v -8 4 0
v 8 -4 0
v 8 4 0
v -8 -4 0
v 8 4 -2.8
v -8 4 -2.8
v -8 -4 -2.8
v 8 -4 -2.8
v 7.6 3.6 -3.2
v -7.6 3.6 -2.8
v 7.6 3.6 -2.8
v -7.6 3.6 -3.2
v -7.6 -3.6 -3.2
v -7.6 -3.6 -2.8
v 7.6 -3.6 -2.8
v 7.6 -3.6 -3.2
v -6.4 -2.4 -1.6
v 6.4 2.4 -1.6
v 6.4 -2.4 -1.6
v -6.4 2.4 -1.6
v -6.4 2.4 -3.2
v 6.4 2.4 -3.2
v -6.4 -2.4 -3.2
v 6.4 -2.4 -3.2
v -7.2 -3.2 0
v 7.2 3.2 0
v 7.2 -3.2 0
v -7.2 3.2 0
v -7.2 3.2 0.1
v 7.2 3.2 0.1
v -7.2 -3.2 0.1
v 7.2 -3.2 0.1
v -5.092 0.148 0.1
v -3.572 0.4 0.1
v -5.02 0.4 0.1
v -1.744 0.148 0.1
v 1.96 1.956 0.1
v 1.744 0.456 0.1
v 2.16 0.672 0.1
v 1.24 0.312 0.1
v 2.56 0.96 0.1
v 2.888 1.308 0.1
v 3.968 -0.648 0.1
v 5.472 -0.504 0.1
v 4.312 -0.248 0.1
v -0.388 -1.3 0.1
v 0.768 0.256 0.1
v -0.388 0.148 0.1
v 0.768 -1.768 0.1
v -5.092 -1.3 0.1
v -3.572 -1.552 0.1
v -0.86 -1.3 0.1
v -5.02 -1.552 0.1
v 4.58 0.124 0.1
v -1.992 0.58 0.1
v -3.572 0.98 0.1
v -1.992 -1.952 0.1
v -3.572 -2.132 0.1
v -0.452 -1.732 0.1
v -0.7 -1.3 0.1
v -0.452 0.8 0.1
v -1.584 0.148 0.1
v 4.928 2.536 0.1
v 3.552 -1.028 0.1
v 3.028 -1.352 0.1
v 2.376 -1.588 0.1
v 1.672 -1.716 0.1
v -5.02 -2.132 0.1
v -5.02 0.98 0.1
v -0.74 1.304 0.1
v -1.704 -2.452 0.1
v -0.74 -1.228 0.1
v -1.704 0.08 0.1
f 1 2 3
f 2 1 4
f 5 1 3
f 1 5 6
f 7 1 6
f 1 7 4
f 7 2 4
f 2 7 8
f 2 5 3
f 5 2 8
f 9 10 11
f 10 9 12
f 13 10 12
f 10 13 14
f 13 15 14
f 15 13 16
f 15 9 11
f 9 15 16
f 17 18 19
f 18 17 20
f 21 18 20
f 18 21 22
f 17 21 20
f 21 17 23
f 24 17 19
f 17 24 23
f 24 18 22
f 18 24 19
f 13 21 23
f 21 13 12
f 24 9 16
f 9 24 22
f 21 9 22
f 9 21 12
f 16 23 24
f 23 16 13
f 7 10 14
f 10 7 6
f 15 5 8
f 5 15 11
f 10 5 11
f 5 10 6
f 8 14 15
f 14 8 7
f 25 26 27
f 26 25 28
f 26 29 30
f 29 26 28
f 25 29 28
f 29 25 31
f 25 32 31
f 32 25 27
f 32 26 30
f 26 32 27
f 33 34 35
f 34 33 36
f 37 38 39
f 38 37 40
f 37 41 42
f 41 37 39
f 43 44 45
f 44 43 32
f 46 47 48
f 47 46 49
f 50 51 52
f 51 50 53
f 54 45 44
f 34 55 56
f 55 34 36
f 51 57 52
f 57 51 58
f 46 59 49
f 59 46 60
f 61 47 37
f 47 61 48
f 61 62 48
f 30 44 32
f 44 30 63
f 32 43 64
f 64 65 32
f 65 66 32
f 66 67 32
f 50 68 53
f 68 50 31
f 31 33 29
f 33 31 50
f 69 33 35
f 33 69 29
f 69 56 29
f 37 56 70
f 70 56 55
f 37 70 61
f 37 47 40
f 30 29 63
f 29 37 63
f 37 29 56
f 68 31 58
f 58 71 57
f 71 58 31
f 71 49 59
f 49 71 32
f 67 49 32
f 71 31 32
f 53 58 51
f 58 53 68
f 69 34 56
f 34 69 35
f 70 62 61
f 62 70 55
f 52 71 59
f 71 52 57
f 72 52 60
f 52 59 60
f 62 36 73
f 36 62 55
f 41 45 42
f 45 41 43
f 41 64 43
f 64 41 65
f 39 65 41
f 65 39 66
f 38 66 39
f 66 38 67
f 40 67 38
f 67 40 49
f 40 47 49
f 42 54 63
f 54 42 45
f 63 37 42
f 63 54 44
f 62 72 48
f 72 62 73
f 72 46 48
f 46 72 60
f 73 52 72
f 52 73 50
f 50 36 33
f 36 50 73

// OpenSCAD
// file: ../p/box5.scad
use <../lib.scad>
function ldraw_lib__box5() = [
// 0 Box with 5 Faces and All Edges
// 0 Name: box5.dat
// 0 Author: James Jessiman
// 0 !LDRAW_ORG Primitive UPDATE 2012-01
// 0 !LICENSE Licensed under CC BY 4.0 : see CAreadme.txt
// 
// 0 BFC CERTIFY CCW
  [0,"BFC","CERTIFY"],
  [0,"BFC","CCW"],
// 
// 0 !HISTORY 2002-04-03 [sbliss] Modified for BFC compliance
// 0 !HISTORY 2002-04-25 [PTadmin] Official Update 2002-02
// 0 !HISTORY 2007-06-24 [PTadmin] Header formatted for Contributor Agreement
// 0 !HISTORY 2008-07-01 [PTadmin] Official Update 2008-01
// 0 !HISTORY 2012-02-16 [Philo] Changed to CCW
// 0 !HISTORY 2012-03-30 [PTadmin] Official Update 2012-01
// 
// 
// 2 24 1 1 1 -1 1 1
  [2,24,1,1,1,-1,1,1],
// 2 24 -1 1 1 -1 1 -1
  [2,24,-1,1,1,-1,1,-1],
// 2 24 -1 1 -1 1 1 -1
  [2,24,-1,1,-1,1,1,-1],
// 2 24 1 1 -1 1 1 1
  [2,24,1,1,-1,1,1,1],
// 2 24 1 0 1 -1 0 1
  [2,24,1,0,1,-1,0,1],
// 2 24 -1 0 1 -1 0 -1
  [2,24,-1,0,1,-1,0,-1],
// 2 24 -1 0 -1 1 0 -1
  [2,24,-1,0,-1,1,0,-1],
// 2 24 1 0 -1 1 0 1
  [2,24,1,0,-1,1,0,1],
// 2 24 1 0 1 1 1 1
  [2,24,1,0,1,1,1,1],
// 2 24 -1 0 1 -1 1 1
  [2,24,-1,0,1,-1,1,1],
// 2 24 1 0 -1 1 1 -1
  [2,24,1,0,-1,1,1,-1],
// 2 24 -1 0 -1 -1 1 -1
  [2,24,-1,0,-1,-1,1,-1],
// 4 16 -1 1 1 1 1 1 1 1 -1 -1 1 -1
  [4,16,-1,1,1,1,1,1,1,1,-1,-1,1,-1],
// 4 16 -1 1 1 -1 0 1 1 0 1 1 1 1
  [4,16,-1,1,1,-1,0,1,1,0,1,1,1,1],
// 4 16 -1 1 -1 -1 0 -1 -1 0 1 -1 1 1
  [4,16,-1,1,-1,-1,0,-1,-1,0,1,-1,1,1],
// 4 16 1 1 -1 1 0 -1 -1 0 -1 -1 1 -1
  [4,16,1,1,-1,1,0,-1,-1,0,-1,-1,1,-1],
// 4 16 1 1 1 1 0 1 1 0 -1 1 1 -1
  [4,16,1,1,1,1,0,1,1,0,-1,1,1,-1],
];
module ldraw_lib__box5(step=0, col=false, unit=2/5, alt=false, line=0.2, solid=!$preview)
    makepoly(ldraw_lib__box5(), step=step, col=col, unit=unit, alt=alt, line=line, solid=solid);
ldraw_lib__box5(line=0.2);
// file: ../p/box4.scad
use <../lib.scad>
function ldraw_lib__box4() = [
// 0 Box with 4 Faces (2 Parallel Pairs) and All Edges
// 0 Name: box4.dat
// 0 Author: James Jessiman
// 0 !LDRAW_ORG Primitive UPDATE 2012-01
// 0 !LICENSE Licensed under CC BY 4.0 : see CAreadme.txt
// 
// 0 BFC CERTIFY CCW
  [0,"BFC","CERTIFY"],
  [0,"BFC","CCW"],
// 
// 0 !HISTORY 2002-04-03 [sbliss] Modified for BFC compliance
// 0 !HISTORY 2002-04-25 [PTadmin] Official Update 2002-02
// 0 !HISTORY 2007-06-24 [PTadmin] Header formatted for Contributor Agreement
// 0 !HISTORY 2008-07-01 [PTadmin] Official Update 2008-01
// 0 !HISTORY 2012-02-16 [Philo] Changed to CCW
// 0 !HISTORY 2012-03-30 [PTadmin] Official Update 2012-01
// 
// 
// 2 24 1 1 1 -1 1 1
  [2,24,1,1,1,-1,1,1],
// 2 24 -1 1 1 -1 1 -1
  [2,24,-1,1,1,-1,1,-1],
// 2 24 -1 1 -1 1 1 -1
  [2,24,-1,1,-1,1,1,-1],
// 2 24 1 1 -1 1 1 1
  [2,24,1,1,-1,1,1,1],
// 2 24 1 0 1 -1 0 1
  [2,24,1,0,1,-1,0,1],
// 2 24 -1 0 1 -1 0 -1
  [2,24,-1,0,1,-1,0,-1],
// 2 24 -1 0 -1 1 0 -1
  [2,24,-1,0,-1,1,0,-1],
// 2 24 1 0 -1 1 0 1
  [2,24,1,0,-1,1,0,1],
// 2 24 1 0 1 1 1 1
  [2,24,1,0,1,1,1,1],
// 2 24 -1 0 1 -1 1 1
  [2,24,-1,0,1,-1,1,1],
// 2 24 1 0 -1 1 1 -1
  [2,24,1,0,-1,1,1,-1],
// 2 24 -1 0 -1 -1 1 -1
  [2,24,-1,0,-1,-1,1,-1],
// 4 16 -1 1 1 -1 0 1 1 0 1 1 1 1
  [4,16,-1,1,1,-1,0,1,1,0,1,1,1,1],
// 4 16 -1 1 -1 -1 0 -1 -1 0 1 -1 1 1
  [4,16,-1,1,-1,-1,0,-1,-1,0,1,-1,1,1],
// 4 16 1 1 -1 1 0 -1 -1 0 -1 -1 1 -1
  [4,16,1,1,-1,1,0,-1,-1,0,-1,-1,1,-1],
// 4 16 1 1 1 1 0 1 1 0 -1 1 1 -1
  [4,16,1,1,1,1,0,1,1,0,-1,1,1,-1],
];
module ldraw_lib__box4(step=0, col=false, unit=2/5, alt=false, line=0.2, solid=!$preview)
    makepoly(ldraw_lib__box4(), step=step, col=col, unit=unit, alt=alt, line=line, solid=solid);
ldraw_lib__box4(line=0.2);
// file: ../p/box5-12.scad
use <../lib.scad>
function ldraw_lib__box5_12() = [
// 0 Box with 5 Faces without Any Edges
// 0 Name: box5-12.dat
// 0 Author: Chris Dee [cwdee]
// 0 !LDRAW_ORG Primitive UPDATE 2009-02
// 0 !LICENSE Licensed under CC BY 4.0 : see CAreadme.txt
// 
// 0 BFC CERTIFY CCW
  [0,"BFC","CERTIFY"],
  [0,"BFC","CCW"],
// 
// 0 !HISTORY 2009-09-03 [PTadmin] Official Update 2009-02
// 
// 
// 4 16 1 1 1 1 1 -1 -1 1 -1 -1 1 1
  [4,16,1,1,1,1,1,-1,-1,1,-1,-1,1,1],
// 4 16 -1 0 1 1 0 1 1 1 1 -1 1 1
  [4,16,-1,0,1,1,0,1,1,1,1,-1,1,1],
// 4 16 -1 0 -1 -1 0 1 -1 1 1 -1 1 -1
  [4,16,-1,0,-1,-1,0,1,-1,1,1,-1,1,-1],
// 4 16 1 0 -1 -1 0 -1 -1 1 -1 1 1 -1
  [4,16,1,0,-1,-1,0,-1,-1,1,-1,1,1,-1],
// 4 16 1 0 1 1 0 -1 1 1 -1 1 1 1
  [4,16,1,0,1,1,0,-1,1,1,-1,1,1,1],
// 0
];
module ldraw_lib__box5_12(step=0, col=false, unit=2/5, alt=false, line=0.2, solid=!$preview)
    makepoly(ldraw_lib__box5_12(), step=step, col=col, unit=unit, alt=alt, line=line, solid=solid);
ldraw_lib__box5_12(line=0.2);
// file: s/3069bs01.scad
use <../../lib.scad>
use <../../p/box4.scad>
use <../../p/box5.scad>
function ldraw_lib__s__3069bs01() = [
// 0 ~Tile  1 x  2 with Groove without Top Face
// 0 Name: s\3069bs01.dat
// 0 Author: Santeri Piippo [arezey]
// 0 !LDRAW_ORG Subpart UPDATE 2010-02
// 0 !LICENSE Licensed under CC BY 4.0 : see CAreadme.txt
// 
// 0 BFC CERTIFY CCW
  [0,"BFC","CERTIFY"],
  [0,"BFC","CCW"],
// 
// 0 !HISTORY 2010-07-05 [PTadmin] Official Update 2010-02
// 
// 
// 1 16 0 0 0 20 0 0 0 7 0 0 0 10 box4.dat
  [1,16,0,0,0,20,0,0,0,7,0,0,0,10, ldraw_lib__box4()],
// 1 16 0 7 0 19 0 0 0 1 0 0 0 9 box4.dat
  [1,16,0,7,0,19,0,0,0,1,0,0,0,9, ldraw_lib__box4()],
// 0 BFC INVERTNEXT
  [0,"BFC","INVERTNEXT"],
// 1 16 0 8 0 16 0 0 0 -4 0 0 0 6 box5.dat
  [1,16,0,8,0,16,0,0,0,-4,0,0,0,6, ldraw_lib__box5()],
// 4 16 -19 8 9 -16 8 6 -16 8 -6 -19 8 -9
  [4,16,-19,8,9,-16,8,6,-16,8,-6,-19,8,-9],
// 4 16 19 8 -9 16 8 -6 16 8 6 19 8 9
  [4,16,19,8,-9,16,8,-6,16,8,6,19,8,9],
// 4 16 19 8 9 16 8 6 -16 8 6 -19 8 9
  [4,16,19,8,9,16,8,6,-16,8,6,-19,8,9],
// 4 16 -19 8 -9 -16 8 -6 16 8 -6 19 8 -9
  [4,16,-19,8,-9,-16,8,-6,16,8,-6,19,8,-9],
// 4 16 -20 7 10 -19 7 9 -19 7 -9 -20 7 -10
  [4,16,-20,7,10,-19,7,9,-19,7,-9,-20,7,-10],
// 4 16 20 7 -10 19 7 -9 19 7 9 20 7 10
  [4,16,20,7,-10,19,7,-9,19,7,9,20,7,10],
// 4 16 20 7 10 19 7 9 -19 7 9 -20 7 10
  [4,16,20,7,10,19,7,9,-19,7,9,-20,7,10],
// 4 16 -20 7 -10 -19 7 -9 19 7 -9 20 7 -10
  [4,16,-20,7,-10,-19,7,-9,19,7,-9,20,7,-10],
// 0 //
];
module ldraw_lib__s__3069bs01(step=0, col=false, unit=2/5, alt=false, line=0.2, solid=!$preview)
    makepoly(ldraw_lib__s__3069bs01(), step=step, col=col, unit=unit, alt=alt, line=line, solid=solid);
ldraw_lib__s__3069bs01(line=0.2);
// file: 821577g.scad
use <../lib.scad>
use <../p/box5-12.scad>
function ldraw_lib__821577g() = [
// 0 Sticker  0.8 x  1.8 with Car and Red Left Curved Arrow
// 0 Name: 821577g.dat
// 0 Author: Evert-Jan Boer [ejboer]
// 0 !LDRAW_ORG Part UPDATE 2026-07
// 0 !LICENSE Licensed under CC BY 4.0 : see CAreadme.txt
// 
// 0 BFC CERTIFY CCW
  [0,"BFC","CERTIFY"],
  [0,"BFC","CCW"],
// 
// 0 !CATEGORY Sticker
// 0 !KEYWORDS Multi Control, Set 8082
// 
// 0 !HISTORY 2026-07-30 [OrionP] Official Update 2026-07
// 
// 1 16 0 -.25 0 18 0 0 0 0.25 0 0 0 8 box5-12.dat
  [1,16,0,-.25,0,18,0,0,0,0.25,0,0,0,8, ldraw_lib__box5_12()],
// 4 16 -12.73 -.25 .37 -4.36 -.25 .37 -8.93 -.25 1 -12.55 -.25 1
  [4,16,-12.73,-.25,.37,-4.36,-.25,.37,-8.93,-.25,1,-12.55,-.25,1],
// 4 16 4.9 -.25 4.89 3.1 -.25 .78 4.36 -.25 1.14 5.4 -.25 1.68
  [4,16,4.9,-.25,4.89,3.1,-.25,.78,4.36,-.25,1.14,5.4,-.25,1.68],
// 4 16 4.9 -.25 4.89 5.4 -.25 1.68 6.4 -.25 2.4 7.22 -.25 3.27
  [4,16,4.9,-.25,4.89,5.4,-.25,1.68,6.4,-.25,2.4,7.22,-.25,3.27],
// 4 16 13.68 -.25 -1.26 10.78 -.25 -.62 9.92 -.25 -1.62 18 -.25 -8
  [4,16,13.68,-.25,-1.26,10.78,-.25,-.62,9.92,-.25,-1.62,18,-.25,-8],
// 4 16 -.97 -.25 -3.25 1.92 -.25 -4.42 1.92 -.25 .64 -.97 -.25 .37
  [4,16,-.97,-.25,-3.25,1.92,-.25,-4.42,1.92,-.25,.64,-.97,-.25,.37],
// 4 16 -12.73 -.25 -3.25 -12.55 -.25 -3.88 -8.93 -.25 -3.88 -2.15 -.25 -3.25
  [4,16,-12.73,-.25,-3.25,-12.55,-.25,-3.88,-8.93,-.25,-3.88,-2.15,-.25,-3.25],
// 3 16 11.45 -.25 .31 10.78 -.25 -.62 13.68 -.25 -1.26
  [3,16,11.45,-.25,.31,10.78,-.25,-.62,13.68,-.25,-1.26],
// 4 16 -8.93 -.25 1 -4.36 -.25 .37 -4.98 -.25 1.45 -8.93 -.25 2.45
  [4,16,-8.93,-.25,1,-4.36,-.25,.37,-4.98,-.25,1.45,-8.93,-.25,2.45],
// 4 16 -4.98 -.25 -4.88 -2.15 -.25 -3.25 -8.93 -.25 -3.88 -8.93 -.25 -5.33
  [4,16,-4.98,-.25,-4.88,-2.15,-.25,-3.25,-8.93,-.25,-3.88,-8.93,-.25,-5.33],
// 4 16 -.97 -.25 -3.25 -1.75 -.25 -3.25 -1.13 -.25 -4.33 1.92 -.25 -4.42
  [4,16,-.97,-.25,-3.25,-1.75,-.25,-3.25,-1.13,-.25,-4.33,1.92,-.25,-4.42],
// 4 16 -1.13 -.25 2 -.97 -.25 .37 1.92 -.25 .64 4.9 -.25 4.89
  [4,16,-1.13,-.25,2,-.97,-.25,.37,1.92,-.25,.64,4.9,-.25,4.89],
// 3 16 -1.13 -.25 2 -3.96 -.25 .37 -.97 -.25 .37
  [3,16,-1.13,-.25,2,-3.96,-.25,.37,-.97,-.25,.37],
// 4 16 12.32 -.25 6.34 13.68 -.25 -1.26 18 -.25 -8 18 -.25 8
  [4,16,12.32,-.25,6.34,13.68,-.25,-1.26,18,-.25,-8,18,-.25,8],
// 3 16 18 -.25 -8 9.92 -.25 -1.62 8.88 -.25 -2.57
  [3,16,18,-.25,-8,9.92,-.25,-1.62,8.88,-.25,-2.57],
// 3 16 8.88 -.25 -2.57 7.57 -.25 -3.38 18 -.25 -8
  [3,16,8.88,-.25,-2.57,7.57,-.25,-3.38,18,-.25,-8],
// 3 16 7.57 -.25 -3.38 5.94 -.25 -3.97 18 -.25 -8
  [3,16,7.57,-.25,-3.38,5.94,-.25,-3.97,18,-.25,-8],
// 3 16 5.94 -.25 -3.97 4.18 -.25 -4.29 18 -.25 -8
  [3,16,5.94,-.25,-3.97,4.18,-.25,-4.29,18,-.25,-8],
// 4 16 -12.73 -.25 -3.25 -18 -.25 -8 -12.55 -.25 -5.33 -12.55 -.25 -3.88
  [4,16,-12.73,-.25,-3.25,-18,-.25,-8,-12.55,-.25,-5.33,-12.55,-.25,-3.88],
// 4 16 -12.73 -.25 .37 -18 -.25 8 -18 -.25 -8 -12.73 -.25 -3.25
  [4,16,-12.73,-.25,.37,-18,-.25,8,-18,-.25,-8,-12.73,-.25,-3.25],
// 4 16 -18 -.25 8 -12.73 -.25 .37 -12.55 -.25 1 -12.55 -.25 2.45
  [4,16,-18,-.25,8,-12.73,-.25,.37,-12.55,-.25,1,-12.55,-.25,2.45],
// 3 16 -12.55 -.25 2.45 -8.93 -.25 2.45 -18 -.25 8
  [3,16,-12.55,-.25,2.45,-8.93,-.25,2.45,-18,-.25,8],
// 3 16 4.9 -.25 4.89 -8.93 -.25 2.45 -1.85 -.25 3.26
  [3,16,4.9,-.25,4.89,-8.93,-.25,2.45,-1.85,-.25,3.26],
// 3 16 -1.85 -.25 3.26 -8.93 -.25 2.45 -4.98 -.25 1.45
  [3,16,-1.85,-.25,3.26,-8.93,-.25,2.45,-4.98,-.25,1.45],
// 3 16 4.9 -.25 4.89 -1.85 -.25 3.26 -1.13 -.25 2
  [3,16,4.9,-.25,4.89,-1.85,-.25,3.26,-1.13,-.25,2],
// 3 16 4.9 -.25 4.89 1.92 -.25 .64 3.1 -.25 .78
  [3,16,4.9,-.25,4.89,1.92,-.25,.64,3.1,-.25,.78],
// 3 16 18 -.25 8 -18 -.25 8 12.32 -.25 6.34
  [3,16,18,-.25,8,-18,-.25,8,12.32,-.25,6.34],
// 4 16 -8.93 -.25 2.45 4.9 -.25 4.89 12.32 -.25 6.34 -18 -.25 8
  [4,16,-8.93,-.25,2.45,4.9,-.25,4.89,12.32,-.25,6.34,-18,-.25,8],
// 3 16 -12.55 -.25 -5.33 -18 -.25 -8 -8.93 -.25 -5.33
  [3,16,-12.55,-.25,-5.33,-18,-.25,-8,-8.93,-.25,-5.33],
// 4 16 -8.93 -.25 -5.33 -18 -.25 -8 -4.26 -.25 -6.13 -4.98 -.25 -4.88
  [4,16,-8.93,-.25,-5.33,-18,-.25,-8,-4.26,-.25,-6.13,-4.98,-.25,-4.88],
// 4 16 1.92 -.25 -4.42 -1.13 -.25 -4.33 -4.26 -.25 -6.13 18 -.25 -8
  [4,16,1.92,-.25,-4.42,-1.13,-.25,-4.33,-4.26,-.25,-6.13,18,-.25,-8],
// 3 16 4.18 -.25 -4.29 1.92 -.25 -4.42 18 -.25 -8
  [3,16,4.18,-.25,-4.29,1.92,-.25,-4.42,18,-.25,-8],
// 3 16 -4.26 -.25 -6.13 -18 -.25 -8 18 -.25 -8
  [3,16,-4.26,-.25,-6.13,-18,-.25,-8,18,-.25,-8],
// 
// 0 BFC NOCLIP
  [0,"BFC","NOCLIP"],
// 
// 4 14 -12.55 -.25 -3.88 -12.55 -.25 -5.33 -8.93 -.25 -5.33 -8.93 -.25 -3.88
  [4,14,-12.55,-.25,-3.88,-12.55,-.25,-5.33,-8.93,-.25,-5.33,-8.93,-.25,-3.88],
// 4 14 -8.93 -.25 1 -8.93 -.25 2.45 -12.55 -.25 2.45 -12.55 -.25 1
  [4,14,-8.93,-.25,1,-8.93,-.25,2.45,-12.55,-.25,2.45,-12.55,-.25,1],
// 4 14 -4.98 -.25 1.45 -3.96 -.25 .37 -1.13 -.25 2 -1.85 -.25 3.26
  [4,14,-4.98,-.25,1.45,-3.96,-.25,.37,-1.13,-.25,2,-1.85,-.25,3.26],
// 4 14 -4.98 -.25 -4.88 -4.26 -.25 -6.13 -1.13 -.25 -4.33 -2.15 -.25 -3.25
  [4,14,-4.98,-.25,-4.88,-4.26,-.25,-6.13,-1.13,-.25,-4.33,-2.15,-.25,-3.25],
// 3 14 -1.85 -.25 -3.07 -2.15 -.25 -3.25 -1.75 -.25 -3.25
  [3,14,-1.85,-.25,-3.07,-2.15,-.25,-3.25,-1.75,-.25,-3.25],
// 3 14 -2.15 -.25 -3.25 -1.13 -.25 -4.33 -1.75 -.25 -3.25
  [3,14,-2.15,-.25,-3.25,-1.13,-.25,-4.33,-1.75,-.25,-3.25],
// 4 14 -4.26 -.25 .2 -3.96 -.25 .37 -4.98 -.25 1.45 -4.36 -.25 .37
  [4,14,-4.26,-.25,.2,-3.96,-.25,.37,-4.98,-.25,1.45,-4.36,-.25,.37],
// 4 4 6.4 -.25 2.4 9.92 -.25 -1.62 10.78 -.25 -.62 7.22 -.25 3.27
  [4,4,6.4,-.25,2.4,9.92,-.25,-1.62,10.78,-.25,-.62,7.22,-.25,3.27],
// 4 4 6.4 -.25 2.4 7.57 -.25 -3.38 8.88 -.25 -2.57 9.92 -.25 -1.62
  [4,4,6.4,-.25,2.4,7.57,-.25,-3.38,8.88,-.25,-2.57,9.92,-.25,-1.62],
// 4 4 7.57 -.25 -3.38 6.4 -.25 2.4 5.4 -.25 1.68 5.94 -.25 -3.97
  [4,4,7.57,-.25,-3.38,6.4,-.25,2.4,5.4,-.25,1.68,5.94,-.25,-3.97],
// 4 4 5.94 -.25 -3.97 5.4 -.25 1.68 4.36 -.25 1.14 4.18 -.25 -4.29
  [4,4,5.94,-.25,-3.97,5.4,-.25,1.68,4.36,-.25,1.14,4.18,-.25,-4.29],
// 4 4 4.18 -.25 -4.29 4.36 -.25 1.14 3.1 -.25 .78 1.92 -.25 -4.42
  [4,4,4.18,-.25,-4.29,4.36,-.25,1.14,3.1,-.25,.78,1.92,-.25,-4.42],
// 3 4 3.1 -.25 .78 1.92 -.25 .64 1.92 -.25 -4.42
  [3,4,3.1,-.25,.78,1.92,-.25,.64,1.92,-.25,-4.42],
// 4 4 11.45 -.25 .31 12.32 -.25 6.34 7.22 -.25 3.27 10.78 -.25 -.62
  [4,4,11.45,-.25,.31,12.32,-.25,6.34,7.22,-.25,3.27,10.78,-.25,-.62],
// 3 4 12.32 -.25 6.34 4.9 -.25 4.89 7.22 -.25 3.27
  [3,4,12.32,-.25,6.34,4.9,-.25,4.89,7.22,-.25,3.27],
// 3 4 12.32 -.25 6.34 11.45 -.25 .31 13.68 -.25 -1.26
  [3,4,12.32,-.25,6.34,11.45,-.25,.31,13.68,-.25,-1.26],
// 4 0 -4.26 -.25 .2 -1.85 -.25 -3.07 -.97 -.25 .37 -3.96 -.25 .37
  [4,0,-4.26,-.25,.2,-1.85,-.25,-3.07,-.97,-.25,.37,-3.96,-.25,.37],
// 4 0 -.97 -.25 -3.25 -.97 -.25 .37 -1.85 -.25 -3.07 -1.75 -.25 -3.25
  [4,0,-.97,-.25,-3.25,-.97,-.25,.37,-1.85,-.25,-3.07,-1.75,-.25,-3.25],
// 4 0 -2.15 -.25 -3.25 -1.85 -.25 -3.07 -4.26 -.25 .2 -12.73 -.25 -3.25
  [4,0,-2.15,-.25,-3.25,-1.85,-.25,-3.07,-4.26,-.25,.2,-12.73,-.25,-3.25],
// 4 0 -12.73 -.25 -3.25 -4.26 -.25 .2 -4.36 -.25 .37 -12.73 -.25 .37
  [4,0,-12.73,-.25,-3.25,-4.26,-.25,.2,-4.36,-.25,.37,-12.73,-.25,.37],
];
module ldraw_lib__821577g(step=0, col=false, unit=2/5, alt=false, line=0.2, solid=!$preview)
    makepoly(ldraw_lib__821577g(), step=step, col=col, unit=unit, alt=alt, line=line, solid=solid);
ldraw_lib__821577g(line=0.2);
// file: 3069b.scad
use <../lib.scad>
use <s/3069bs01.scad>
function ldraw_lib__3069b() = [
// 0 Tile  1 x  2 with Groove
// 0 Name: 3069b.dat
// 0 Author: Santeri Piippo [arezey]
// 0 !LDRAW_ORG Part UPDATE 2010-02
// 0 !LICENSE Licensed under CC BY 4.0 : see CAreadme.txt
// 
// 0 BFC CERTIFY CCW
  [0,"BFC","CERTIFY"],
  [0,"BFC","CCW"],
// 
// 0 !KEYWORDS BrickLink 3069
// 
// 0 !HISTORY 2010-07-05 [PTadmin] Official Update 2010-02
// 
// 
// 4 16 20 0 -10 20 0 10 -20 0 10 -20 0 -10
  [4,16,20,0,-10,20,0,10,-20,0,10,-20,0,-10],
// 1 16 0 0 0 1 0 0 0 1 0 0 0 1 s\3069bs01.dat
  [1,16,0,0,0,1,0,0,0,1,0,0,0,1, ldraw_lib__s__3069bs01()],
// 0 //
];
module ldraw_lib__3069b(step=0, col=false, unit=2/5, alt=false, line=0.2, solid=!$preview)
    makepoly(ldraw_lib__3069b(), step=step, col=col, unit=unit, alt=alt, line=line, solid=solid);
ldraw_lib__3069b(line=0.2);
// main file
use <../lib.scad>
use <3069b.scad>
use <821577g.scad>
function ldraw_lib__3069bd1w() = [
// 0 Tile  1 x  2 with Car and Red Left Curved Arrow Sticker
// 0 Name: 3069bd1w.dat
// 0 Author: Evert-Jan Boer [ejboer]
// 0 !LDRAW_ORG Shortcut UPDATE 2026-07
// 0 !LICENSE Licensed under CC BY 4.0 : see CAreadme.txt
// 
// 0 BFC CERTIFY CCW
  [0,"BFC","CERTIFY"],
  [0,"BFC","CCW"],
// 
// 0 !CATEGORY Sticker Shortcut
// 0 !KEYWORDS Bricklink 3069pb0065, Set 8082
// 
// 0 !HISTORY 2026-07-30 [OrionP] Official Update 2026-07
// 
// 1 16 0 0 0 1 0 0 0 1 0 0 0 1 3069b.dat
  [1,16,0,0,0,1,0,0,0,1,0,0,0,1, ldraw_lib__3069b()],
// 1 16 0 0 0 1 0 0 0 1 0 0 0 1 821577g.dat
  [1,16,0,0,0,1,0,0,0,1,0,0,0,1, ldraw_lib__821577g()],
];
module ldraw_lib__3069bd1w(step=0, col=false, unit=2/5, alt=false, line=0.2, solid=!$preview)
    makepoly(ldraw_lib__3069bd1w(), step=step, col=col, unit=unit, alt=alt, line=line, solid=solid);
ldraw_lib__3069bd1w(line=0.2);
